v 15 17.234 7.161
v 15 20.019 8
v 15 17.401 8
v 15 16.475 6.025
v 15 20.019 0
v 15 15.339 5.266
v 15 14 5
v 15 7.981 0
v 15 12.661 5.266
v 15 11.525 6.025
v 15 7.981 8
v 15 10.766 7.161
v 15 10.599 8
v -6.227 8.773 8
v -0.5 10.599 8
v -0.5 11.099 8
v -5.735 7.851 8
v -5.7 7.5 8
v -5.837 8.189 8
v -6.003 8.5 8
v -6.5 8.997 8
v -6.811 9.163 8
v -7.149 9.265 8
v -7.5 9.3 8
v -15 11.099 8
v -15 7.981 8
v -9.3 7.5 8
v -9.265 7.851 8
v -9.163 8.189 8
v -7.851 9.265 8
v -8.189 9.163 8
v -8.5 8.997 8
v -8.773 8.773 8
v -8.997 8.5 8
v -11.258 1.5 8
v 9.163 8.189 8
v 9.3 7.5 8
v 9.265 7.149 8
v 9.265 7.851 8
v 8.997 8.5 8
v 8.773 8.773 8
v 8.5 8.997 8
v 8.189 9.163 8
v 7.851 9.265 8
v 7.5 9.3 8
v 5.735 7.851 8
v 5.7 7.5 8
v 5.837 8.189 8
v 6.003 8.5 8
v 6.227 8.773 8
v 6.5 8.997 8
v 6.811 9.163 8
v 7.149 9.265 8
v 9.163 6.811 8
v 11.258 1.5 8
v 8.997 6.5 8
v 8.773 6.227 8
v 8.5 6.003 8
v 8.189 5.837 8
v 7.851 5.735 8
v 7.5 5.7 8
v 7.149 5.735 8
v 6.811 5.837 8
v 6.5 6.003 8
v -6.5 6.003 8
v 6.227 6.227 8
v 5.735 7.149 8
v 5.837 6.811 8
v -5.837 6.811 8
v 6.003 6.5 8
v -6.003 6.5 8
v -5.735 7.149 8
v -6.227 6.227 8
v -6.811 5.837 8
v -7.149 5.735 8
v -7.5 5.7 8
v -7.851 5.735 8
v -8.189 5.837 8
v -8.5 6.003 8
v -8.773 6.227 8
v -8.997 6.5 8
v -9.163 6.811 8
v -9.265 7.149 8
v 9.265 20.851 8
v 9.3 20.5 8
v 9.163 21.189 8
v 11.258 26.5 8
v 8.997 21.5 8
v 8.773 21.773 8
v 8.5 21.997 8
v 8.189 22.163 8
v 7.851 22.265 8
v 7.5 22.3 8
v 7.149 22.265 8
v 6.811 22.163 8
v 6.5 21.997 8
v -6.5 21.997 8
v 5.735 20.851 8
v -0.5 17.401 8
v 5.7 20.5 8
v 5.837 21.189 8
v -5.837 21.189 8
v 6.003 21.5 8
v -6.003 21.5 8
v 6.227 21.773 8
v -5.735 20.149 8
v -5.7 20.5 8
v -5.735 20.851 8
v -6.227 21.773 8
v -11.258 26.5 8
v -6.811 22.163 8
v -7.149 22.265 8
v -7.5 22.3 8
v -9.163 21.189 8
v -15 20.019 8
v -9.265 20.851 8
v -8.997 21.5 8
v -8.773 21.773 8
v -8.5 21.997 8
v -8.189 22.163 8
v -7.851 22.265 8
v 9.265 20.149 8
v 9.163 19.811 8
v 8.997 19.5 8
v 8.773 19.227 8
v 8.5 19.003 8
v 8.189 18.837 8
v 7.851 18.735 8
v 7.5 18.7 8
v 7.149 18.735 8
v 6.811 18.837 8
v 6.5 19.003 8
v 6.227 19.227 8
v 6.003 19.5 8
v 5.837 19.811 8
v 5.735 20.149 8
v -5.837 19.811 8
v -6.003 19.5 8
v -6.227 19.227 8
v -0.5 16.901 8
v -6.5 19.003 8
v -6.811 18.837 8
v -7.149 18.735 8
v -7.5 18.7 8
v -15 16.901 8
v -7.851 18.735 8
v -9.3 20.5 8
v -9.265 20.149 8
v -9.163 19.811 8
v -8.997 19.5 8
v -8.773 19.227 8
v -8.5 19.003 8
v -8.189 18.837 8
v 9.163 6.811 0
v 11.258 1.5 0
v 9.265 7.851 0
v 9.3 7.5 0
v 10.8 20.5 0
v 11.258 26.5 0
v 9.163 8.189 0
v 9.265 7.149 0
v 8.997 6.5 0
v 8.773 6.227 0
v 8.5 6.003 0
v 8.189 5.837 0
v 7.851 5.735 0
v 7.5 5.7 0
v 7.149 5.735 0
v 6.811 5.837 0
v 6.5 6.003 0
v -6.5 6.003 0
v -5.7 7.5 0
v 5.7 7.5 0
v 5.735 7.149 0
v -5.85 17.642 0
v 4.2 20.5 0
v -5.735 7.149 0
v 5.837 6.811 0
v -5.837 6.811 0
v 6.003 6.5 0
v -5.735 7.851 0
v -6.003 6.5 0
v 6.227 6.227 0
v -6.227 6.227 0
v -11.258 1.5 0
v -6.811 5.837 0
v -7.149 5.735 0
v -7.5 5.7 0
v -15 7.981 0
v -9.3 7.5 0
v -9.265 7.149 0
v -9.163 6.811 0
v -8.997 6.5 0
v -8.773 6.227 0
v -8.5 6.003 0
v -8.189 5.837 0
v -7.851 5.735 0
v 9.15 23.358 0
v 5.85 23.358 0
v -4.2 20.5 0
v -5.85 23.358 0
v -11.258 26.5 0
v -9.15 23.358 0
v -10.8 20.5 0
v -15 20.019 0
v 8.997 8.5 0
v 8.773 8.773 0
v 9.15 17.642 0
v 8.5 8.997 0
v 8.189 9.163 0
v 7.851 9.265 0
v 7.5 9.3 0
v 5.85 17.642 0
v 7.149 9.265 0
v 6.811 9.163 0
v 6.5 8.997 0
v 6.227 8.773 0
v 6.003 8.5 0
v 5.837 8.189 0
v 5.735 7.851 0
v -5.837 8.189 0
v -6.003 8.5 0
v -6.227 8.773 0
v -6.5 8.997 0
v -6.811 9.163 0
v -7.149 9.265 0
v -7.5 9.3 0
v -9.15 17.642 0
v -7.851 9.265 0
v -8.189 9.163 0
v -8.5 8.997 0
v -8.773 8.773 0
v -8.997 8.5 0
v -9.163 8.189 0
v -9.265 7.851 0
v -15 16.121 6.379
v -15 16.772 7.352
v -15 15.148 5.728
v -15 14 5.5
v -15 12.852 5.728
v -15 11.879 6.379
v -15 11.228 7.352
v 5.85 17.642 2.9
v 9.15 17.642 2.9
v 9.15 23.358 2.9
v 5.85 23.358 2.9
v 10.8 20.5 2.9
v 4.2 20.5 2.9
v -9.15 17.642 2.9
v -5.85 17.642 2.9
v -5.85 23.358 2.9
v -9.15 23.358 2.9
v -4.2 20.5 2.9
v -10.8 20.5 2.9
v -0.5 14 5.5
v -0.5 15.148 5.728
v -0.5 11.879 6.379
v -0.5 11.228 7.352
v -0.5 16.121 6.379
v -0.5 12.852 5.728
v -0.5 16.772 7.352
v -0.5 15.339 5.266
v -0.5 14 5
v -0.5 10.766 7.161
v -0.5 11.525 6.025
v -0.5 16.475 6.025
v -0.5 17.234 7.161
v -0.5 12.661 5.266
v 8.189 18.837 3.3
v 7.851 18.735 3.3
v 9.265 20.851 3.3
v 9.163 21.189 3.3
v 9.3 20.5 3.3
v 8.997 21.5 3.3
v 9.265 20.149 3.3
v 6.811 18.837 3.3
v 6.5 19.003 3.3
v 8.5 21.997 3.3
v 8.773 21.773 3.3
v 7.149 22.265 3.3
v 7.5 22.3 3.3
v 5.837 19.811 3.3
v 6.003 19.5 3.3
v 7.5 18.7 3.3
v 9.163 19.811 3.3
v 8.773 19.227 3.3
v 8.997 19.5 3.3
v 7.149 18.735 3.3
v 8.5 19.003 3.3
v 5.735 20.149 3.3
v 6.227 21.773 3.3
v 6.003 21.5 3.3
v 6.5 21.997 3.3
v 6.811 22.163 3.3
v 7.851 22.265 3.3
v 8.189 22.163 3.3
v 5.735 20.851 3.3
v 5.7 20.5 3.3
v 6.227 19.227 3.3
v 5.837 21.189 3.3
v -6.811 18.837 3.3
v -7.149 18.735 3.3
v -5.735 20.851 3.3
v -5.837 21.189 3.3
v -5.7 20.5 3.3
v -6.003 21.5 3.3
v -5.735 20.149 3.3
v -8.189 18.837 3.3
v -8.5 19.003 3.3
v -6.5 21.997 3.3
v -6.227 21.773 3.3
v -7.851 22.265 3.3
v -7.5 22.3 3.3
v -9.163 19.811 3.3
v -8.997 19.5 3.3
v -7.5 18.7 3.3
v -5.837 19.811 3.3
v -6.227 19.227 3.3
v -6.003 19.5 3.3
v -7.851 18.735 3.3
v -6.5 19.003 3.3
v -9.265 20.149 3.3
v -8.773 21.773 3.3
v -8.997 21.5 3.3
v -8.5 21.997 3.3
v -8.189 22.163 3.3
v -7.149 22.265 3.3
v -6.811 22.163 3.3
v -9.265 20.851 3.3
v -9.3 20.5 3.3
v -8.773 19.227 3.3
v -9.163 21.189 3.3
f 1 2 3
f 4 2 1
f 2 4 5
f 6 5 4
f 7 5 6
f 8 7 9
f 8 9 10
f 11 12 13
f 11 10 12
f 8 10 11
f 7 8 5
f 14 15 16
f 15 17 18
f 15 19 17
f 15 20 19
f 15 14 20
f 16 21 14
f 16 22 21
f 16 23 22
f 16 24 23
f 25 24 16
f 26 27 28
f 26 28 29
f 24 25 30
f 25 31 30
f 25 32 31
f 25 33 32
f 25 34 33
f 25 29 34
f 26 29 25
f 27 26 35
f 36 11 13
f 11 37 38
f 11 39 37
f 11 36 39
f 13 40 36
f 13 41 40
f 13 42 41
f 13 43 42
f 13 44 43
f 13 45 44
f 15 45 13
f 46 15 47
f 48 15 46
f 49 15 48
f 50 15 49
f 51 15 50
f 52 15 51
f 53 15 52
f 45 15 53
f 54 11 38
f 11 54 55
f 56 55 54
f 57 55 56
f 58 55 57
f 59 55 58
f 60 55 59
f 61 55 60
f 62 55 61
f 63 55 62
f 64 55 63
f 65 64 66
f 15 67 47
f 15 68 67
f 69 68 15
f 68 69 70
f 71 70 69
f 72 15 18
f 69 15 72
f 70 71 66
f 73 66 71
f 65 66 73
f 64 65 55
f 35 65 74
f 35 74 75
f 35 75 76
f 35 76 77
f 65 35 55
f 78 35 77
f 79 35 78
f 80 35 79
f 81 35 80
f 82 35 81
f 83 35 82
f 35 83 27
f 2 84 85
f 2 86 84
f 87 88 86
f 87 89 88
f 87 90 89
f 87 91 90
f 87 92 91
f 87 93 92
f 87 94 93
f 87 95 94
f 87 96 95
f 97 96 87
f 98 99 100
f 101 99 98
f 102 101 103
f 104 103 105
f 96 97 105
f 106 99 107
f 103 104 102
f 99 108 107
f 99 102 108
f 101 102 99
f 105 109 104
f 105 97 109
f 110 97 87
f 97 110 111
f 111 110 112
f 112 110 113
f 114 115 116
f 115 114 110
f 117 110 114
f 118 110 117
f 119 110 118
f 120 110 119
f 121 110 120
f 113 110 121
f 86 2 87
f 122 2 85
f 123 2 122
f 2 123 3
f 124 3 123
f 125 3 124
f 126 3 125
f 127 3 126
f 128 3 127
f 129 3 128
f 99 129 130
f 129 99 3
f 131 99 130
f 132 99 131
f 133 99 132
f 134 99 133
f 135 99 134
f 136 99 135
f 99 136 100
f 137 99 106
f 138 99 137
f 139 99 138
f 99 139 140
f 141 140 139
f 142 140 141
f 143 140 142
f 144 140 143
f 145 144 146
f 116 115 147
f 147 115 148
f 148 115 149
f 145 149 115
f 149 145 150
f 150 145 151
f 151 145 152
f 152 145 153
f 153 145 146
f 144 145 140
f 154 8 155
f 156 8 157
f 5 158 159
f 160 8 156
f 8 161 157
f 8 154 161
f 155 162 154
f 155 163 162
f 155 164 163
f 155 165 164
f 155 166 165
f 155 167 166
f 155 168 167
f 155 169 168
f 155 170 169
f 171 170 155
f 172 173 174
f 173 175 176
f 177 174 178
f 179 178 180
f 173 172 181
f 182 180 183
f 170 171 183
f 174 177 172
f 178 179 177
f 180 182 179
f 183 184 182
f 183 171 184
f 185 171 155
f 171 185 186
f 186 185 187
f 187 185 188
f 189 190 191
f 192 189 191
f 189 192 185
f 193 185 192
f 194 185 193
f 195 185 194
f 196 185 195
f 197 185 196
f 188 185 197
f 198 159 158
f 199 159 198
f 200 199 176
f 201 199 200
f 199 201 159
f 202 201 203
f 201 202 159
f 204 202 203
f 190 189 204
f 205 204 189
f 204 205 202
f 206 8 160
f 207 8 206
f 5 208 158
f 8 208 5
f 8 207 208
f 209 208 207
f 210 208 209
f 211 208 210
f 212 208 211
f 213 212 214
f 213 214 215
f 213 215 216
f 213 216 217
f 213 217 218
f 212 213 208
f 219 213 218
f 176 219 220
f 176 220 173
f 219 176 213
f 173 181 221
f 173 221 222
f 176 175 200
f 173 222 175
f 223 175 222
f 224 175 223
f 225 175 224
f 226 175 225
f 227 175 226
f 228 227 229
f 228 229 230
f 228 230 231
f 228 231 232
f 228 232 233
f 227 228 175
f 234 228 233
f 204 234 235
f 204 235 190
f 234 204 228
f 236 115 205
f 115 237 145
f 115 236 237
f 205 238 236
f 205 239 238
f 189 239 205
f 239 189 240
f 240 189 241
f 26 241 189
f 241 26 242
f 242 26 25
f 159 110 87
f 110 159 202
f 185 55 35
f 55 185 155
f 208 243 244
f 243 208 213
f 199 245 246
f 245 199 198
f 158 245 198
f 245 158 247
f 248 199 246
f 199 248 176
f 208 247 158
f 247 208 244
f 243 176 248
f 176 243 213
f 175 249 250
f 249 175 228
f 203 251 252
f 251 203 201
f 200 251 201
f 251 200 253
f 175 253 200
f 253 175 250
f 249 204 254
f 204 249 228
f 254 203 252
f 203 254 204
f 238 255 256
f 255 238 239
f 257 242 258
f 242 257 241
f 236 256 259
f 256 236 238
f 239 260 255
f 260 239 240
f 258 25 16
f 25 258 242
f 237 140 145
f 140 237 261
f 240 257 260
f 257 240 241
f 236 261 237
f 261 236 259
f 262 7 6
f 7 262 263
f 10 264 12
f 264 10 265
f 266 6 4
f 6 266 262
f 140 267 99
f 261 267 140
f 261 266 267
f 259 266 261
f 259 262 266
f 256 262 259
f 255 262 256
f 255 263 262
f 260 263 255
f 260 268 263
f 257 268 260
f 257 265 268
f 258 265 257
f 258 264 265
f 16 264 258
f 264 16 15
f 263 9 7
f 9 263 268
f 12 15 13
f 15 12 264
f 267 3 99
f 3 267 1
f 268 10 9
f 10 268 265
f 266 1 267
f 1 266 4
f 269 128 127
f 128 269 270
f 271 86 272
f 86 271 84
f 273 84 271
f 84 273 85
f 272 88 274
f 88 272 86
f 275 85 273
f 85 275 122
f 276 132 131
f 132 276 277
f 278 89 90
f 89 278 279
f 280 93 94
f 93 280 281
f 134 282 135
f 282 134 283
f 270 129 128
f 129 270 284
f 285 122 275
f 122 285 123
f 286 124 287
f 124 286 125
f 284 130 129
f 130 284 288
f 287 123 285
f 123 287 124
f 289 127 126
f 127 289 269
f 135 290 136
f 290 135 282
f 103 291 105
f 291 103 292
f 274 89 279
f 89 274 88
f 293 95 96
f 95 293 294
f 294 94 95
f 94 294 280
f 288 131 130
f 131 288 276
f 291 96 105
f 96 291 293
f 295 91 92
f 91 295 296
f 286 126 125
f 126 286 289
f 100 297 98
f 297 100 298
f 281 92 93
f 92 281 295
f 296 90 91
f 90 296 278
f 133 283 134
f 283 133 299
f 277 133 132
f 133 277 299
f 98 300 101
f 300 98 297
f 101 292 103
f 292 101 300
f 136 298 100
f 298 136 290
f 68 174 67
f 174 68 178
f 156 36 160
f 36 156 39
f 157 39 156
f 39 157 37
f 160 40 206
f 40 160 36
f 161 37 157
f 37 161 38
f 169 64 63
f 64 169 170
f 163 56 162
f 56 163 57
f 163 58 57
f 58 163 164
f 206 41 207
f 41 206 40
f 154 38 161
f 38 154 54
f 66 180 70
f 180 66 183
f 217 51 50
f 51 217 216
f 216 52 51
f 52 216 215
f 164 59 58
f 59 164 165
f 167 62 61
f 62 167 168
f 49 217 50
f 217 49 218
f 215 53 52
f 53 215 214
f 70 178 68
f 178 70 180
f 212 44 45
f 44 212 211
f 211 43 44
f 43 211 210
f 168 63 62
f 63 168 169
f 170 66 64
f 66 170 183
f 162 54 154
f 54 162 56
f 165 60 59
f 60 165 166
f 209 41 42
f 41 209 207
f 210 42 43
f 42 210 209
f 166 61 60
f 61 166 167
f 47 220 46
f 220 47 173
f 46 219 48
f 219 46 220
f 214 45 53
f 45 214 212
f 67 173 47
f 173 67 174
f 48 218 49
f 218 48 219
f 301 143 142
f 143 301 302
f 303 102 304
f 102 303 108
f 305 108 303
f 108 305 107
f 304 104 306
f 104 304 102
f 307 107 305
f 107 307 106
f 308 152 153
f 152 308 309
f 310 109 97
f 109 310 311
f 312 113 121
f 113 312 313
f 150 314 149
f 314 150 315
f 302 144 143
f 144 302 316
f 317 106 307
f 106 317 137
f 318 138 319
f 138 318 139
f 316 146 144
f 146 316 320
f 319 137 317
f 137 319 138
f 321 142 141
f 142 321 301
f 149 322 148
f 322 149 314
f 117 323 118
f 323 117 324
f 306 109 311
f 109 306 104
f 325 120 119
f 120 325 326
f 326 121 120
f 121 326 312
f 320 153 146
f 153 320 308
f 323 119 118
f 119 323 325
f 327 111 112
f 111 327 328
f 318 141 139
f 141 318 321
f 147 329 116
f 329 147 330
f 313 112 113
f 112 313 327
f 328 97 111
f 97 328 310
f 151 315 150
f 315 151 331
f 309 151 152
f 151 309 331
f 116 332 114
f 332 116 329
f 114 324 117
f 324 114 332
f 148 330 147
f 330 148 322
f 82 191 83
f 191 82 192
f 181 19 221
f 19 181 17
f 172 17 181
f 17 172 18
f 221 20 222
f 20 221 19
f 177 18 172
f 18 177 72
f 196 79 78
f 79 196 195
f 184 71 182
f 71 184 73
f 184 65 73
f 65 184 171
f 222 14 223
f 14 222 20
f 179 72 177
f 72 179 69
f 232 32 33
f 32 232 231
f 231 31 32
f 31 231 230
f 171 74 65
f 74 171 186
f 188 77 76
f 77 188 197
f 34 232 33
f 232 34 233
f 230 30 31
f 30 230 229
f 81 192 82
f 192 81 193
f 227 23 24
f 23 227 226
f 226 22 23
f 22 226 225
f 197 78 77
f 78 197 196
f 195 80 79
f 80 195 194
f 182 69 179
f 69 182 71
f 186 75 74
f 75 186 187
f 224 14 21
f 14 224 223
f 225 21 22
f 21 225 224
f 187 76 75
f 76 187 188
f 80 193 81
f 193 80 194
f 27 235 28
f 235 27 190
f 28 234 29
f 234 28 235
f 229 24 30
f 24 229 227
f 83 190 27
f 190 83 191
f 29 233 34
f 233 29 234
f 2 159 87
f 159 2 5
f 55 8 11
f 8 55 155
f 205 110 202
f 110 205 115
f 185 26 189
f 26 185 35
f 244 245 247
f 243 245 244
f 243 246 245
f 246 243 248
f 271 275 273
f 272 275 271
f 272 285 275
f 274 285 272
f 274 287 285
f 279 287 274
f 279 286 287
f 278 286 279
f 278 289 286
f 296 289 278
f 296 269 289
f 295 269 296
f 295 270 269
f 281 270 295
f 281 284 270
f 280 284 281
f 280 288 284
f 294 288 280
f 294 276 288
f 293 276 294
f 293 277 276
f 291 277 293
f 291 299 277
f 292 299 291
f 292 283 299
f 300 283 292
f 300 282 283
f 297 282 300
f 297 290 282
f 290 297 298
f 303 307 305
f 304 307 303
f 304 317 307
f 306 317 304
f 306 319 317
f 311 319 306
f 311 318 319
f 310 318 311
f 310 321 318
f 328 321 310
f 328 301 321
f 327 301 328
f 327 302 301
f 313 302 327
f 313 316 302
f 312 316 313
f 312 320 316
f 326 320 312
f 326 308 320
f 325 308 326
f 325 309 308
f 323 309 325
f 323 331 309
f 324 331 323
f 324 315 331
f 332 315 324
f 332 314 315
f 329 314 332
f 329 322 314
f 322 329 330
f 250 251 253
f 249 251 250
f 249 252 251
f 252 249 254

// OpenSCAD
// PRUSA Mendel  
// Coupling from nophead
// GNU GPL v3
// Josef Průša
// josefprusa@me.com
// prusadjs.cz
// http://www.reprap.org/wiki/Prusa_Mendel
// http://github.com/prusajr/PrusaMendel
//
// This one is AWESOME design by NOPHEAD
// Modified to be symmetrically and have an orientation sign

$fn=32;
//include <configuration.scad>
m3_diameter = 3.6;
m3_nut_diameter = 5.3+1.3;
m3_nut_diameter_horizontal = 6.1;



/**
 * @id coupling
 * @name Coupling
 * @category Printed
 * @using 2 m3x20
 * @using 2 m3washer
 * @using 2 m3nut
 * @step Make sure the M3 bolts can move freely inside the round holes. If not, ream them out. 
 * @step Clean out the bridges from the couplings
 * @step Place M3 nuts in all nut traps.
 * @step Insert screws with washers on them and tighten them just a bit prior to installation.
 */

/**
 * 20mm long piece of PVC tube. 
 * 5mm inside diameter, 8mm outside diameter
 * or flexible PVC: 4mm inside diameter, 7mm outer diameter
 * This can be usually found in aquarium shops.
 * @id coupling-tube
 * @name Coupling tube
 * @category Nuts&bolts
 */

holeX = 7.5;
holeY = 6.5;

holeR = 3.4;
nutR = 3.25;
nutH = 3;
corner_cut = 26;

studding_dia = 6.0;
shaft_dia = 7.0;

module coupling(c){
    union(){
        difference(){
            cube(size = [30,25,8], center = true);

			//slot
			*cube(size = [2,40,30], center = true);

			//nut holes
			translate([ holeX,  holeY, nutH/2 - 4.01-3/2]) cylinder(r=m3_nut_diameter/2,h=3,$fn=6);
			translate([-holeX,  holeY, nutH/2 - 4.01-3/2]) cylinder(r=m3_nut_diameter/2,h=3,$fn=6);

            //shaft groves
            translate([ -16, 0, 4.5]) rotate([0,90,0]) cylinder(h = 16, r=studding_dia / 2, $fn=16);
            translate([-0.5, 0, 4.5]) rotate([0,90,0]) cylinder(h = 16, r=shaft_dia / 2,    $fn=16);

            //screw holes
            translate([ holeX,  holeY, -10]) cylinder(r=m3_diameter/2,h=20);
            translate([ holeX, -holeY, -10]) cylinder(r=m3_diameter/2,h=20);
            translate([-holeX,  holeY, -10]) cylinder(r=m3_diameter/2,h=20);
            translate([-holeX, -holeY, -10]) cylinder(r=m3_diameter/2,h=20);

            //corners
            rotate([0,0,30])   translate([corner_cut, 0, 0]) cube(size = [20,40,20], center = true);
            rotate([0,0,-30])  translate([corner_cut, 0, 0]) cube(size = [20,40,20], center = true);
            rotate([0,0,150])  translate([corner_cut, 0, 0]) cube(size = [20,40,20], center = true);
            rotate([0,0,-150]) translate([corner_cut, 0, 0]) cube(size = [20,40,20], center = true);
	
			#translate(v=[-5,4,-4]) rotate(a=-90,v=[0,0,1]) scale([0.5,0.6,1]) linear_extrude(file = "this-way-up.dxf", layer = "0", height = 2, center = true, convexity = 10);
        }
        // bridge
    	translate([ holeX,  holeY, nutH-3.9]) cylinder(h = 0.4, r=nutR+0.1, $fn=6, center=true);
    	translate([-holeX,  holeY, nutH-3.9]) cylinder(h = 0.4, r=nutR+0.1, $fn=6, center=true);
    }
}

translate([0, 14, 4]) coupling(c=0);
//translate([0, -14, 4]) rotate([0,0,180]) coupling(c=1);
